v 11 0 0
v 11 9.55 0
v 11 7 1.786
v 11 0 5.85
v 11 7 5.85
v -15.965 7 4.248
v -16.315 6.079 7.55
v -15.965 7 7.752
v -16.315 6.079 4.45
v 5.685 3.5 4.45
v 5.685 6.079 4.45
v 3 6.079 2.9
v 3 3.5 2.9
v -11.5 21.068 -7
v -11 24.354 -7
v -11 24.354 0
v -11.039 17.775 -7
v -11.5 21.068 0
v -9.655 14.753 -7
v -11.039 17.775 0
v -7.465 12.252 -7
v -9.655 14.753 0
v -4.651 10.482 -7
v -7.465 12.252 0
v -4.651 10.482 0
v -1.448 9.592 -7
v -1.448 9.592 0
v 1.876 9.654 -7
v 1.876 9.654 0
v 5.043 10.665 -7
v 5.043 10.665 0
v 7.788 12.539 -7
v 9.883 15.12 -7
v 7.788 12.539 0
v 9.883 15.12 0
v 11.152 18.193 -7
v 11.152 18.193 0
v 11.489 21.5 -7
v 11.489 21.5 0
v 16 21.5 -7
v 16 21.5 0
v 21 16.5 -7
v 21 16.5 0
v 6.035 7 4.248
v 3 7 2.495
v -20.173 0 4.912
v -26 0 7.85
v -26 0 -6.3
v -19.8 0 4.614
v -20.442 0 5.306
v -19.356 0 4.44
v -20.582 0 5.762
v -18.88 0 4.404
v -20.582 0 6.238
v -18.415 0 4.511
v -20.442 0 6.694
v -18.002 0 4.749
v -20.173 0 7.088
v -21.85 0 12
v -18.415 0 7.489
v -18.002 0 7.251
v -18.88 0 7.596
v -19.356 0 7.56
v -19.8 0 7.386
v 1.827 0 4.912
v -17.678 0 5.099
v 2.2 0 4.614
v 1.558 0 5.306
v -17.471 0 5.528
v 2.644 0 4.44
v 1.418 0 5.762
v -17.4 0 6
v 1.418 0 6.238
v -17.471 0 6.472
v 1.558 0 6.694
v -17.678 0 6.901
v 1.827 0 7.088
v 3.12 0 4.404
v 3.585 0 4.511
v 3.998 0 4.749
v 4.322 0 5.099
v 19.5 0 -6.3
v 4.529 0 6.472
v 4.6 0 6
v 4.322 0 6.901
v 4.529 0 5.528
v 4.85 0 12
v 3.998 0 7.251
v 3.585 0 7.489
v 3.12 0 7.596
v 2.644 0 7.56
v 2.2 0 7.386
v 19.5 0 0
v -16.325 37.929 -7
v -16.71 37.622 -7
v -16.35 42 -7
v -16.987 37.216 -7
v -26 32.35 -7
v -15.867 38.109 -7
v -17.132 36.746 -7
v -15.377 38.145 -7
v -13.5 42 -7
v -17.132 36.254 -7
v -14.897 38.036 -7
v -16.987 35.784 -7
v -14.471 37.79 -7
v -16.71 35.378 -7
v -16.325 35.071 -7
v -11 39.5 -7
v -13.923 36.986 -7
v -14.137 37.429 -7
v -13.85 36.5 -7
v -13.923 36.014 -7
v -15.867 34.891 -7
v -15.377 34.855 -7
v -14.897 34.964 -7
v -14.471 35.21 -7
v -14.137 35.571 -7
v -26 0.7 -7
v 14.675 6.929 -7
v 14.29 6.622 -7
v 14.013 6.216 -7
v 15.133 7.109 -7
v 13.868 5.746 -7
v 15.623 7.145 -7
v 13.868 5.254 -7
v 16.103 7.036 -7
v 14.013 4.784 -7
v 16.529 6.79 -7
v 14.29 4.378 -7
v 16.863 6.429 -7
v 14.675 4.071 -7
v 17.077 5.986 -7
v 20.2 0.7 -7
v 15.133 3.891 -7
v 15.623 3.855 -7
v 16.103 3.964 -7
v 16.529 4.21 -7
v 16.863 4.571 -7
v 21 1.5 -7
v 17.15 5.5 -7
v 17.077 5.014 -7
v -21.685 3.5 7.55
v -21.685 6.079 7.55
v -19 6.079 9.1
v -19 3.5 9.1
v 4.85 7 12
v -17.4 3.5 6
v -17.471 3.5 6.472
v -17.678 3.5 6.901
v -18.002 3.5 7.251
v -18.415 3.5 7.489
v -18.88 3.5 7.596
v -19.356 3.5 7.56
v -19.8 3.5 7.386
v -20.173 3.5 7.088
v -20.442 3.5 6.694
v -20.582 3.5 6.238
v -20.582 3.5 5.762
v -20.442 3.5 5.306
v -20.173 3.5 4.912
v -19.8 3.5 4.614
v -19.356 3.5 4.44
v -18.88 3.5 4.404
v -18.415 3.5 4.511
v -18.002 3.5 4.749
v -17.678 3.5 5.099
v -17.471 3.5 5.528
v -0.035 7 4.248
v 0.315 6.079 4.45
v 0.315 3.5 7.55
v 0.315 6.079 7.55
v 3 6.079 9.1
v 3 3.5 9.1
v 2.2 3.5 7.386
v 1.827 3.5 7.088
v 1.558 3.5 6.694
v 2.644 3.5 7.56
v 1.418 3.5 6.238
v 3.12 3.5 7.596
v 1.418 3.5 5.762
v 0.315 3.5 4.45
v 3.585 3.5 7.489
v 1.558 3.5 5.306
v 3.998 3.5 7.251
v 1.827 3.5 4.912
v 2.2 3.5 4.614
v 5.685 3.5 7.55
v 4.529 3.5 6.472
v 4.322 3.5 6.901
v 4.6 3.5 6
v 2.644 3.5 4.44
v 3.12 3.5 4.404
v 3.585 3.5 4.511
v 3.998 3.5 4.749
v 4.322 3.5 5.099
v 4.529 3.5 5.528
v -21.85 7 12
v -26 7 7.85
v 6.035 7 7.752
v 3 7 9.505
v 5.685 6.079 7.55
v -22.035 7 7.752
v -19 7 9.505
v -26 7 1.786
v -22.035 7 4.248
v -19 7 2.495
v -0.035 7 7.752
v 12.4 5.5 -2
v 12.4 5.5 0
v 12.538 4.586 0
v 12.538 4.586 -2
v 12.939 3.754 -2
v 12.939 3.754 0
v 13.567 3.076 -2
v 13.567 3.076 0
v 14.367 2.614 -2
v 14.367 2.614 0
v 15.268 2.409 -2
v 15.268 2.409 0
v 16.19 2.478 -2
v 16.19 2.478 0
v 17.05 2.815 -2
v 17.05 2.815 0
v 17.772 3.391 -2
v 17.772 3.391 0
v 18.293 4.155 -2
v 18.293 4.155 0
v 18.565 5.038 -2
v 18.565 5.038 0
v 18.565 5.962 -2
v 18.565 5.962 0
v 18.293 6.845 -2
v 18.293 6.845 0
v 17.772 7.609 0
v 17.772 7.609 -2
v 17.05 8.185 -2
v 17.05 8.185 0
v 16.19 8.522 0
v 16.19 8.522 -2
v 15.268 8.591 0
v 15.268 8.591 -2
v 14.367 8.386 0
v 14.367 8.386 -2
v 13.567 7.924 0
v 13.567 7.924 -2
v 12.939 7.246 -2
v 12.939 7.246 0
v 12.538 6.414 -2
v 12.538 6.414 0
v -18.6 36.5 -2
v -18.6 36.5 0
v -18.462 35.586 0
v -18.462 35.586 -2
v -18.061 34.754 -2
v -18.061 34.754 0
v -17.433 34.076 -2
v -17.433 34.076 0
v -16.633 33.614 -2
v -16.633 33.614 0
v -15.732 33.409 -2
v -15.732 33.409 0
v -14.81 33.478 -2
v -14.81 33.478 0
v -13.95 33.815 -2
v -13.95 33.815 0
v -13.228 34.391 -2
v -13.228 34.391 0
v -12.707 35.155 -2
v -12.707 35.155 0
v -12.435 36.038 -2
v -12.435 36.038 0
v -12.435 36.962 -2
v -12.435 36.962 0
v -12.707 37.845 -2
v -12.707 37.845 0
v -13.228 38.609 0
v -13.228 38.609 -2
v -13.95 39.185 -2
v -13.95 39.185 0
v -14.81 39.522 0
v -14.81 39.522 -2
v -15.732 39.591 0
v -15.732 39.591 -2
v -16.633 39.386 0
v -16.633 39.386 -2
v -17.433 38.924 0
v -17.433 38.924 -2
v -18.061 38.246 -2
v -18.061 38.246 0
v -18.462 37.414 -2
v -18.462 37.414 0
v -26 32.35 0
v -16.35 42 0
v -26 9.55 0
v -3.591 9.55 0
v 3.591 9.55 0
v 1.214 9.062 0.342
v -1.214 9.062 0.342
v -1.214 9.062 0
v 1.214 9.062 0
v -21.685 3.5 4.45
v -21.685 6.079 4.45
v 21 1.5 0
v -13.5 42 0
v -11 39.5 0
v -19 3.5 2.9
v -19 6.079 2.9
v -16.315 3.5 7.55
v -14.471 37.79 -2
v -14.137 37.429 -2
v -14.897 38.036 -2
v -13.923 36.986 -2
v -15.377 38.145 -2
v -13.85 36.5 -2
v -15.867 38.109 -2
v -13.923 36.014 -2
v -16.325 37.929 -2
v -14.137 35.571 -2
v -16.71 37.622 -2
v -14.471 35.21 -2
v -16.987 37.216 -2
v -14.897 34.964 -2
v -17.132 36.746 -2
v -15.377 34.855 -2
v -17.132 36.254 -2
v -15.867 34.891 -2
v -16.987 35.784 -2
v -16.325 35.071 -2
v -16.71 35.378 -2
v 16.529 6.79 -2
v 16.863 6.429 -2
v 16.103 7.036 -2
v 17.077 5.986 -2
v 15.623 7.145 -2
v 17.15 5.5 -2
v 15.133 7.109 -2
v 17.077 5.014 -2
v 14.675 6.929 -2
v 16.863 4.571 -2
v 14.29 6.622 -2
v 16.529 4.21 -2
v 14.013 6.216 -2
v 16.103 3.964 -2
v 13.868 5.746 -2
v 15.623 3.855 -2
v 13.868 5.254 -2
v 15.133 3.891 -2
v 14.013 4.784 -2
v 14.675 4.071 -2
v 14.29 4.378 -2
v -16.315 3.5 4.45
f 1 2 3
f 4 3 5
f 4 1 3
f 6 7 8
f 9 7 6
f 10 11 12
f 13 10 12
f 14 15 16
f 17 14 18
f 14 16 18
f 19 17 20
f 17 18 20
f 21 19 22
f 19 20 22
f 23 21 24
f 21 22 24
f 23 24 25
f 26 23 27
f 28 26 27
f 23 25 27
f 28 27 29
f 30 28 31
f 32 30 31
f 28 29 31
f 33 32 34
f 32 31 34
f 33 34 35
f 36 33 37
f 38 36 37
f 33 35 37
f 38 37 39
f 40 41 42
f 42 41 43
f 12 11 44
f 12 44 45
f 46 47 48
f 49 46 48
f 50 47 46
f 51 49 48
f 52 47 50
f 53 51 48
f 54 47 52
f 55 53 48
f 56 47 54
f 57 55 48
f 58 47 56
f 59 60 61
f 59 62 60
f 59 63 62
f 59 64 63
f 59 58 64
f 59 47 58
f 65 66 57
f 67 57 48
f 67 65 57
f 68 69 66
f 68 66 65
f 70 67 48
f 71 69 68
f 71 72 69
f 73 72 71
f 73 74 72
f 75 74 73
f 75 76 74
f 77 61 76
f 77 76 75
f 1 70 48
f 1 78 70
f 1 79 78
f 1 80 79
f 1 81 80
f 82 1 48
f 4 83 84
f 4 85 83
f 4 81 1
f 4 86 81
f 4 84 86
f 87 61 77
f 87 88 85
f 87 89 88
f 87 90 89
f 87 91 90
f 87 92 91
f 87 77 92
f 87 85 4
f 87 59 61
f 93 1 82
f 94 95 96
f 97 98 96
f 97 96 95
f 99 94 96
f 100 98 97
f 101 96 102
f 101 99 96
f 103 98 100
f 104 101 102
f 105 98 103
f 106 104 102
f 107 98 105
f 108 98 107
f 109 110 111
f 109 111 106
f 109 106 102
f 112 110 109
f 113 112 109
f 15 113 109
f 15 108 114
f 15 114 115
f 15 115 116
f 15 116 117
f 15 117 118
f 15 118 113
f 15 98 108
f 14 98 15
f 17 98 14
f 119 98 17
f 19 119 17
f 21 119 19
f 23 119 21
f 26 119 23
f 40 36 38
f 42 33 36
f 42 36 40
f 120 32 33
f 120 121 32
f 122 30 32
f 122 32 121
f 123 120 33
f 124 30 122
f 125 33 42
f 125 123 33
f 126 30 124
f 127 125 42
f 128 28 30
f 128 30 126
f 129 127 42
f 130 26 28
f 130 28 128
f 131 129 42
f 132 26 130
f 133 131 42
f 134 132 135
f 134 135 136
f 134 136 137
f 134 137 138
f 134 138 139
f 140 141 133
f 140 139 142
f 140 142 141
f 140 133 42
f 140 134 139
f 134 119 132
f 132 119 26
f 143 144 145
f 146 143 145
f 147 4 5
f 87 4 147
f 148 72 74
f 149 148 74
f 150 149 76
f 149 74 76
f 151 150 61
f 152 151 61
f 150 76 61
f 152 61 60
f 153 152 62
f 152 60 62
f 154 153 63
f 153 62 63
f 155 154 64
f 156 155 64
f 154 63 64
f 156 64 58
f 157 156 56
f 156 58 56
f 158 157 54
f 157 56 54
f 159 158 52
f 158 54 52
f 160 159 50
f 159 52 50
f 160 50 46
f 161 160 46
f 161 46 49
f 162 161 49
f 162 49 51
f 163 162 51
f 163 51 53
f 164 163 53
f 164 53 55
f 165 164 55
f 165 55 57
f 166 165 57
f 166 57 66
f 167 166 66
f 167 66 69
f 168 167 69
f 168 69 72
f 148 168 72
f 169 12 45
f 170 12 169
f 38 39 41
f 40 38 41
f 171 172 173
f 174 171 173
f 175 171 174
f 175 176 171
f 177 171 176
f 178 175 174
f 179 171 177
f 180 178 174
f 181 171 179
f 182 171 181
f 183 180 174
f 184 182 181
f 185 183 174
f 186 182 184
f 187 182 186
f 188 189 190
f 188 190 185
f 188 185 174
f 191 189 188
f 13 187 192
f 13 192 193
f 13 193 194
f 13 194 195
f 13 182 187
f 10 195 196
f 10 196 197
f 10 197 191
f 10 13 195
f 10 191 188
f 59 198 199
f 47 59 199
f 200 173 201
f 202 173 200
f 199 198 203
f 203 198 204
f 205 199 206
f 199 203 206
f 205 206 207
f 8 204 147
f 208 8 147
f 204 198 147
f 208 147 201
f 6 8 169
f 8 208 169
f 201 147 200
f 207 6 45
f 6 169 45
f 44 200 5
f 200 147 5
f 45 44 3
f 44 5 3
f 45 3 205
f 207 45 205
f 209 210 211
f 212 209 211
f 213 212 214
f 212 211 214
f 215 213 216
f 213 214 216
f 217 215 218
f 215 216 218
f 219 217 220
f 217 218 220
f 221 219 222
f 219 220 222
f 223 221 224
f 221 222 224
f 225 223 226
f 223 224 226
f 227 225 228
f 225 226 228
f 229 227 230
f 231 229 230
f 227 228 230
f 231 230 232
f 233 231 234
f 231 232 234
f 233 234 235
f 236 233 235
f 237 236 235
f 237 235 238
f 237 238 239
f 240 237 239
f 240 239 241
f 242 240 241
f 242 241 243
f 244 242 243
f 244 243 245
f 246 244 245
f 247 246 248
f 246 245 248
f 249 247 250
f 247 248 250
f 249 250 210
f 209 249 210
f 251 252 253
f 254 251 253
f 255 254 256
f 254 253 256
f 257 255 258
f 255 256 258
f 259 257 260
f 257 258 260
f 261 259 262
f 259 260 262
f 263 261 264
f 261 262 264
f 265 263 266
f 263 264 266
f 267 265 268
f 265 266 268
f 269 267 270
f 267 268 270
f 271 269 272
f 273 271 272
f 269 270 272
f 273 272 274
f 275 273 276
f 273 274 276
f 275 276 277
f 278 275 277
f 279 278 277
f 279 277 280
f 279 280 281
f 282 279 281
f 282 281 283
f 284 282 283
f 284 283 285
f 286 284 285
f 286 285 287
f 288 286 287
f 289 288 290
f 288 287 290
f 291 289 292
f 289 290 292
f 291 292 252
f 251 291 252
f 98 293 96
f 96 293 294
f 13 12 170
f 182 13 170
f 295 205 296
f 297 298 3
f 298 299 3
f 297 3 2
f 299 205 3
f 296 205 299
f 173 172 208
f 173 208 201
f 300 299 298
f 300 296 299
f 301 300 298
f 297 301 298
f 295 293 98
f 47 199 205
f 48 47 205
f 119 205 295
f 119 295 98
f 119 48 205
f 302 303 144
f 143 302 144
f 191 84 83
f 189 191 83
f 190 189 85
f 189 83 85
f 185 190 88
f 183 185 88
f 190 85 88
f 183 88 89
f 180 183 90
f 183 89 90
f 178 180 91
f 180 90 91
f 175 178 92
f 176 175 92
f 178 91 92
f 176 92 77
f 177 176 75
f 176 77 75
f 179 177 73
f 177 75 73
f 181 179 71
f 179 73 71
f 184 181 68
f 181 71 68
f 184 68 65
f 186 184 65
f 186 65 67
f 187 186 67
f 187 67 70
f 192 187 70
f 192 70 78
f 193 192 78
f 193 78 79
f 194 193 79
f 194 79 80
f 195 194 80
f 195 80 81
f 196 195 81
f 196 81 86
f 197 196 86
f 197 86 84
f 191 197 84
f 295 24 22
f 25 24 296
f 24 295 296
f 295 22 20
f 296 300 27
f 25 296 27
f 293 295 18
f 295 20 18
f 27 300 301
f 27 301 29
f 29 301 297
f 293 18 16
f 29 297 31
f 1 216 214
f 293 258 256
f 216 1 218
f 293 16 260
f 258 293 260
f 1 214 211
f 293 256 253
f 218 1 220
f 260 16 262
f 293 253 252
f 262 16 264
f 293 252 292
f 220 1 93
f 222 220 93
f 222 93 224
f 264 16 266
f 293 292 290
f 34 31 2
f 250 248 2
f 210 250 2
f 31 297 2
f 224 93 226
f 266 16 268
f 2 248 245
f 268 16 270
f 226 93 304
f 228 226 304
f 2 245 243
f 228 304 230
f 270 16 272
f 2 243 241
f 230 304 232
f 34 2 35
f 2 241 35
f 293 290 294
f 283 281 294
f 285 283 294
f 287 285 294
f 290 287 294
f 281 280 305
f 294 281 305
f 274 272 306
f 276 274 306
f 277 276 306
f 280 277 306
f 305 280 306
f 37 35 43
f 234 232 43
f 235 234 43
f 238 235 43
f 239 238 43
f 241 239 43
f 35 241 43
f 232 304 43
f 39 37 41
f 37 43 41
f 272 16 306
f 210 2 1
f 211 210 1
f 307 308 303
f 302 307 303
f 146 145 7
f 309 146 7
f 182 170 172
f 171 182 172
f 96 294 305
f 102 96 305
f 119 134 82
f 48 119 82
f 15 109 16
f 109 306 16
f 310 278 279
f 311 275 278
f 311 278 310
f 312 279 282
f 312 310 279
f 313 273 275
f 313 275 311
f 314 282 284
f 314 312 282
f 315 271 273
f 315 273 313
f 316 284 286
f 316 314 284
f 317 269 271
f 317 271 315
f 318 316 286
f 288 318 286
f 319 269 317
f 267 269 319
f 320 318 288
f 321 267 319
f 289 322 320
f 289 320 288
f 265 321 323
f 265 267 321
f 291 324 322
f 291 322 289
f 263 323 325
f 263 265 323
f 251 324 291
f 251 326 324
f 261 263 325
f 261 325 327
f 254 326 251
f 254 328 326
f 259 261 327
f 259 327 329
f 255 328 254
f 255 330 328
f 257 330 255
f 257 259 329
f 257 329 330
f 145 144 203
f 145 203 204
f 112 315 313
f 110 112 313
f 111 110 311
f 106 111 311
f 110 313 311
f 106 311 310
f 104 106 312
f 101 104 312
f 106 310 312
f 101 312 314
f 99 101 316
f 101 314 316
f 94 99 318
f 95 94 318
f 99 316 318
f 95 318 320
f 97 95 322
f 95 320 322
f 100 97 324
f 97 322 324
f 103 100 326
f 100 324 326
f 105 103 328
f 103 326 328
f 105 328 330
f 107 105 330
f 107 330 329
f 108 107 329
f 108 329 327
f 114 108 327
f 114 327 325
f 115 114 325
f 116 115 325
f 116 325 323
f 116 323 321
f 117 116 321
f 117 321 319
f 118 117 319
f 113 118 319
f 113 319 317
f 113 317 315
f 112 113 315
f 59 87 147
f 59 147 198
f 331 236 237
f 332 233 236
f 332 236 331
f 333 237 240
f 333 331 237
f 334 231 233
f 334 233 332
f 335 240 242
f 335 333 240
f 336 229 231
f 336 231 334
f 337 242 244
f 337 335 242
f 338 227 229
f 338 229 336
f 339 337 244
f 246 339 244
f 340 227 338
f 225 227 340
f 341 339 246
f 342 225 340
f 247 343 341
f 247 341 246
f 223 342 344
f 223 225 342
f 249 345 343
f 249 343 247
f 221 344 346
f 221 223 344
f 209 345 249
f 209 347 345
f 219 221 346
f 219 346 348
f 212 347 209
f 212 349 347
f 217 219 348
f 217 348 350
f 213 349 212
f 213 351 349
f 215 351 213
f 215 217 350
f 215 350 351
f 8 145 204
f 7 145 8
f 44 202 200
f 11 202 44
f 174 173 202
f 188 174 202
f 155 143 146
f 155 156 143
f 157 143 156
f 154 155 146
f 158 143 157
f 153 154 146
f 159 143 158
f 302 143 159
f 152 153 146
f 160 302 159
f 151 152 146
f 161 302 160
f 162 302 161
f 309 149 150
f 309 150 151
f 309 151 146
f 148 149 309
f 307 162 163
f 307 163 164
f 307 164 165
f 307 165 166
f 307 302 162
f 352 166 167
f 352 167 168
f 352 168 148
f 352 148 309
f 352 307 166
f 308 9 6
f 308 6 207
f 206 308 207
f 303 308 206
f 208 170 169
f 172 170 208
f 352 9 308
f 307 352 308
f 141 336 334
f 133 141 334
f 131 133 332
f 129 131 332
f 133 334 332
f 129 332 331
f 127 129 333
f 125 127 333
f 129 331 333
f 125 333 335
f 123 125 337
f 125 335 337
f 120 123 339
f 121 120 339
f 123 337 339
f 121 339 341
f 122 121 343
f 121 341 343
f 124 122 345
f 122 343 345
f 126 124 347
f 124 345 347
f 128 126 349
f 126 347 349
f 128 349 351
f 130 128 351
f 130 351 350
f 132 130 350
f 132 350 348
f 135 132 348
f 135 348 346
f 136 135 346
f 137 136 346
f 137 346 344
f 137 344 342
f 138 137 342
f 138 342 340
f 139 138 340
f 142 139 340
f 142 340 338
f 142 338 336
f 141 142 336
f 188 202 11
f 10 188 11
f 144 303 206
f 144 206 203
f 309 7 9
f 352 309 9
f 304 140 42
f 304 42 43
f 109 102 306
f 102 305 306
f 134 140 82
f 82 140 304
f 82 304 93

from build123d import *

# Parameters (mm, degrees)
SKETCH_R             = 1.6
PAD_DEPTH            = 42
SKETCH001_R          = 1.65
POCKET_DEPTH         = 7.001
POCKET_DEPTH_BACK    = 12.001
POCKET001_DEPTH      = 26.001
POCKET001_DEPTH_BACK = 21.001
POCKET002_DEPTH      = 3.5
CHAMFER_ANGLE        = 69.184
CHAMFER_SIZE         = 0.35
SKETCH004_R          = 3.1
POCKET003_DEPTH      = 2
SKETCH005_R          = 12
POCKET004_DEPTH      = 12.001


with BuildPart() as part:
    # Sketch → Pad (new body)
    with BuildSketch(Plane.XZ):
        Polygon((-26, -7), (21, -7), (21, 0), (11, 0), (11, 5.85), (4.85, 12), (-21.85, 12), (-26, 7.85), align=None)
        with Locations((-19, 6)):
            Circle(SKETCH_R, mode=Mode.SUBTRACT)
        with Locations((3, 6)):
            Circle(SKETCH_R, mode=Mode.SUBTRACT)
    extrude(amount=-PAD_DEPTH)

    # Sketch001 → Pocket (cut, two sides)
    with BuildSketch(Plane.XY) as pocket_sk:
        with Locations((-15.5, 36.5)):
            Circle(SKETCH001_R)
        with Locations((15.5, 5.5)):
            Circle(SKETCH001_R)
        with BuildLine():
            Line((-27, 31.35), (-15.35, 43))
            Line((-15.35, 43), (-14.5, 43))
            Line((-14.5, 43), (-11, 39.5))
            Line((-11, 39.5), (-11, 24.354102))
            ThreePointArc((-11, 24.354102), (-1.447855, 9.591507), (11.489125, 21.5))
            Line((11.489125, 21.5), (16, 21.5))
            Line((16, 21.5), (22, 15.5))
            Line((22, 15.5), (22, 44))
            Line((22, 44), (-27, 44))
            Line((-27, 44), (-27, 31.35))
        make_face()
        Polygon((21.5, 2), (19.5, 0), (21.5, 0), align=None)
    extrude(amount=-POCKET_DEPTH, mode=Mode.SUBTRACT)
    extrude(pocket_sk.sketch, amount=POCKET_DEPTH_BACK, mode=Mode.SUBTRACT)

    # Sketch002 → Pocket001 (cut, two sides)
    with BuildSketch(Plane.YZ) as pocket001_sk:
        Polygon((7, 13), (7, 1.785529), (9.55, 0), (43, 0), (43, 13), align=None)
        Polygon((0, -7.3), (1, -7.3), (0, -6.3), align=None)
    extrude(amount=-POCKET001_DEPTH, mode=Mode.SUBTRACT)
    extrude(pocket001_sk.sketch, amount=POCKET001_DEPTH_BACK, mode=Mode.SUBTRACT)

    # Sketch003 (on Face18 of Pocket001) → Pocket002 (cut)
    with BuildSketch(Plane(origin=(0, 7, 0), x_dir=(1, 0, 0), z_dir=(0, 1, 0))):
        Polygon((-16.315, -4.449815), (-19, -2.899629), (-21.685, -4.449815), (-21.685, -7.550185), (-19, -9.100371), (-16.315, -7.550185), align=None)
        Polygon((5.685, -4.449815), (3, -2.899629), (0.315, -4.449815), (0.315, -7.550185), (3, -9.100371), (5.685, -7.550185), align=None)
    extrude(amount=-POCKET002_DEPTH, mode=Mode.SUBTRACT)

    # Chamfer
    chamfer_edges = [part.edges().sort_by_distance(p)[0] for p in [
        (-16.315, 7, 6),
        (-17.6575, 7, 3.674722),
        (-20.3425, 7, 3.674722),
        (-21.685, 7, 6),
        (-20.3425, 7, 8.325278),
        (-17.6575, 7, 8.325278),
        (1.6575, 7, 8.325278),
        (4.3425, 7, 8.325278),
        (5.685, 7, 6),
        (4.3425, 7, 3.674722),
        (1.6575, 7, 3.674722),
        (0.315, 7, 6),
    ]]
    chamfer_side = part.faces().sort_by_distance((-7.961685, 7, 6.742023))[0]
    chamfer(chamfer_edges, length=CHAMFER_SIZE, angle=CHAMFER_ANGLE, reference=chamfer_side)

    # Sketch004 (on Face28 of Chamfer) → Pocket003 (cut)
    with BuildSketch(Plane(origin=(0, 0, 0), x_dir=(-1, 0, 0), z_dir=(0, 0, 1))):
        with Locations((-15.5, -5.5)):
            Circle(SKETCH004_R)
        with Locations((15.5, -36.5)):
            Circle(SKETCH004_R)
    extrude(amount=-POCKET003_DEPTH, mode=Mode.SUBTRACT)

    # Sketch005 → Pocket004 (cut, through all)
    with BuildSketch(Plane.XY):
        with Locations((0, 21)):
            Circle(SKETCH005_R)
    extrude(amount=POCKET004_DEPTH, mode=Mode.SUBTRACT)


solid = part.part
